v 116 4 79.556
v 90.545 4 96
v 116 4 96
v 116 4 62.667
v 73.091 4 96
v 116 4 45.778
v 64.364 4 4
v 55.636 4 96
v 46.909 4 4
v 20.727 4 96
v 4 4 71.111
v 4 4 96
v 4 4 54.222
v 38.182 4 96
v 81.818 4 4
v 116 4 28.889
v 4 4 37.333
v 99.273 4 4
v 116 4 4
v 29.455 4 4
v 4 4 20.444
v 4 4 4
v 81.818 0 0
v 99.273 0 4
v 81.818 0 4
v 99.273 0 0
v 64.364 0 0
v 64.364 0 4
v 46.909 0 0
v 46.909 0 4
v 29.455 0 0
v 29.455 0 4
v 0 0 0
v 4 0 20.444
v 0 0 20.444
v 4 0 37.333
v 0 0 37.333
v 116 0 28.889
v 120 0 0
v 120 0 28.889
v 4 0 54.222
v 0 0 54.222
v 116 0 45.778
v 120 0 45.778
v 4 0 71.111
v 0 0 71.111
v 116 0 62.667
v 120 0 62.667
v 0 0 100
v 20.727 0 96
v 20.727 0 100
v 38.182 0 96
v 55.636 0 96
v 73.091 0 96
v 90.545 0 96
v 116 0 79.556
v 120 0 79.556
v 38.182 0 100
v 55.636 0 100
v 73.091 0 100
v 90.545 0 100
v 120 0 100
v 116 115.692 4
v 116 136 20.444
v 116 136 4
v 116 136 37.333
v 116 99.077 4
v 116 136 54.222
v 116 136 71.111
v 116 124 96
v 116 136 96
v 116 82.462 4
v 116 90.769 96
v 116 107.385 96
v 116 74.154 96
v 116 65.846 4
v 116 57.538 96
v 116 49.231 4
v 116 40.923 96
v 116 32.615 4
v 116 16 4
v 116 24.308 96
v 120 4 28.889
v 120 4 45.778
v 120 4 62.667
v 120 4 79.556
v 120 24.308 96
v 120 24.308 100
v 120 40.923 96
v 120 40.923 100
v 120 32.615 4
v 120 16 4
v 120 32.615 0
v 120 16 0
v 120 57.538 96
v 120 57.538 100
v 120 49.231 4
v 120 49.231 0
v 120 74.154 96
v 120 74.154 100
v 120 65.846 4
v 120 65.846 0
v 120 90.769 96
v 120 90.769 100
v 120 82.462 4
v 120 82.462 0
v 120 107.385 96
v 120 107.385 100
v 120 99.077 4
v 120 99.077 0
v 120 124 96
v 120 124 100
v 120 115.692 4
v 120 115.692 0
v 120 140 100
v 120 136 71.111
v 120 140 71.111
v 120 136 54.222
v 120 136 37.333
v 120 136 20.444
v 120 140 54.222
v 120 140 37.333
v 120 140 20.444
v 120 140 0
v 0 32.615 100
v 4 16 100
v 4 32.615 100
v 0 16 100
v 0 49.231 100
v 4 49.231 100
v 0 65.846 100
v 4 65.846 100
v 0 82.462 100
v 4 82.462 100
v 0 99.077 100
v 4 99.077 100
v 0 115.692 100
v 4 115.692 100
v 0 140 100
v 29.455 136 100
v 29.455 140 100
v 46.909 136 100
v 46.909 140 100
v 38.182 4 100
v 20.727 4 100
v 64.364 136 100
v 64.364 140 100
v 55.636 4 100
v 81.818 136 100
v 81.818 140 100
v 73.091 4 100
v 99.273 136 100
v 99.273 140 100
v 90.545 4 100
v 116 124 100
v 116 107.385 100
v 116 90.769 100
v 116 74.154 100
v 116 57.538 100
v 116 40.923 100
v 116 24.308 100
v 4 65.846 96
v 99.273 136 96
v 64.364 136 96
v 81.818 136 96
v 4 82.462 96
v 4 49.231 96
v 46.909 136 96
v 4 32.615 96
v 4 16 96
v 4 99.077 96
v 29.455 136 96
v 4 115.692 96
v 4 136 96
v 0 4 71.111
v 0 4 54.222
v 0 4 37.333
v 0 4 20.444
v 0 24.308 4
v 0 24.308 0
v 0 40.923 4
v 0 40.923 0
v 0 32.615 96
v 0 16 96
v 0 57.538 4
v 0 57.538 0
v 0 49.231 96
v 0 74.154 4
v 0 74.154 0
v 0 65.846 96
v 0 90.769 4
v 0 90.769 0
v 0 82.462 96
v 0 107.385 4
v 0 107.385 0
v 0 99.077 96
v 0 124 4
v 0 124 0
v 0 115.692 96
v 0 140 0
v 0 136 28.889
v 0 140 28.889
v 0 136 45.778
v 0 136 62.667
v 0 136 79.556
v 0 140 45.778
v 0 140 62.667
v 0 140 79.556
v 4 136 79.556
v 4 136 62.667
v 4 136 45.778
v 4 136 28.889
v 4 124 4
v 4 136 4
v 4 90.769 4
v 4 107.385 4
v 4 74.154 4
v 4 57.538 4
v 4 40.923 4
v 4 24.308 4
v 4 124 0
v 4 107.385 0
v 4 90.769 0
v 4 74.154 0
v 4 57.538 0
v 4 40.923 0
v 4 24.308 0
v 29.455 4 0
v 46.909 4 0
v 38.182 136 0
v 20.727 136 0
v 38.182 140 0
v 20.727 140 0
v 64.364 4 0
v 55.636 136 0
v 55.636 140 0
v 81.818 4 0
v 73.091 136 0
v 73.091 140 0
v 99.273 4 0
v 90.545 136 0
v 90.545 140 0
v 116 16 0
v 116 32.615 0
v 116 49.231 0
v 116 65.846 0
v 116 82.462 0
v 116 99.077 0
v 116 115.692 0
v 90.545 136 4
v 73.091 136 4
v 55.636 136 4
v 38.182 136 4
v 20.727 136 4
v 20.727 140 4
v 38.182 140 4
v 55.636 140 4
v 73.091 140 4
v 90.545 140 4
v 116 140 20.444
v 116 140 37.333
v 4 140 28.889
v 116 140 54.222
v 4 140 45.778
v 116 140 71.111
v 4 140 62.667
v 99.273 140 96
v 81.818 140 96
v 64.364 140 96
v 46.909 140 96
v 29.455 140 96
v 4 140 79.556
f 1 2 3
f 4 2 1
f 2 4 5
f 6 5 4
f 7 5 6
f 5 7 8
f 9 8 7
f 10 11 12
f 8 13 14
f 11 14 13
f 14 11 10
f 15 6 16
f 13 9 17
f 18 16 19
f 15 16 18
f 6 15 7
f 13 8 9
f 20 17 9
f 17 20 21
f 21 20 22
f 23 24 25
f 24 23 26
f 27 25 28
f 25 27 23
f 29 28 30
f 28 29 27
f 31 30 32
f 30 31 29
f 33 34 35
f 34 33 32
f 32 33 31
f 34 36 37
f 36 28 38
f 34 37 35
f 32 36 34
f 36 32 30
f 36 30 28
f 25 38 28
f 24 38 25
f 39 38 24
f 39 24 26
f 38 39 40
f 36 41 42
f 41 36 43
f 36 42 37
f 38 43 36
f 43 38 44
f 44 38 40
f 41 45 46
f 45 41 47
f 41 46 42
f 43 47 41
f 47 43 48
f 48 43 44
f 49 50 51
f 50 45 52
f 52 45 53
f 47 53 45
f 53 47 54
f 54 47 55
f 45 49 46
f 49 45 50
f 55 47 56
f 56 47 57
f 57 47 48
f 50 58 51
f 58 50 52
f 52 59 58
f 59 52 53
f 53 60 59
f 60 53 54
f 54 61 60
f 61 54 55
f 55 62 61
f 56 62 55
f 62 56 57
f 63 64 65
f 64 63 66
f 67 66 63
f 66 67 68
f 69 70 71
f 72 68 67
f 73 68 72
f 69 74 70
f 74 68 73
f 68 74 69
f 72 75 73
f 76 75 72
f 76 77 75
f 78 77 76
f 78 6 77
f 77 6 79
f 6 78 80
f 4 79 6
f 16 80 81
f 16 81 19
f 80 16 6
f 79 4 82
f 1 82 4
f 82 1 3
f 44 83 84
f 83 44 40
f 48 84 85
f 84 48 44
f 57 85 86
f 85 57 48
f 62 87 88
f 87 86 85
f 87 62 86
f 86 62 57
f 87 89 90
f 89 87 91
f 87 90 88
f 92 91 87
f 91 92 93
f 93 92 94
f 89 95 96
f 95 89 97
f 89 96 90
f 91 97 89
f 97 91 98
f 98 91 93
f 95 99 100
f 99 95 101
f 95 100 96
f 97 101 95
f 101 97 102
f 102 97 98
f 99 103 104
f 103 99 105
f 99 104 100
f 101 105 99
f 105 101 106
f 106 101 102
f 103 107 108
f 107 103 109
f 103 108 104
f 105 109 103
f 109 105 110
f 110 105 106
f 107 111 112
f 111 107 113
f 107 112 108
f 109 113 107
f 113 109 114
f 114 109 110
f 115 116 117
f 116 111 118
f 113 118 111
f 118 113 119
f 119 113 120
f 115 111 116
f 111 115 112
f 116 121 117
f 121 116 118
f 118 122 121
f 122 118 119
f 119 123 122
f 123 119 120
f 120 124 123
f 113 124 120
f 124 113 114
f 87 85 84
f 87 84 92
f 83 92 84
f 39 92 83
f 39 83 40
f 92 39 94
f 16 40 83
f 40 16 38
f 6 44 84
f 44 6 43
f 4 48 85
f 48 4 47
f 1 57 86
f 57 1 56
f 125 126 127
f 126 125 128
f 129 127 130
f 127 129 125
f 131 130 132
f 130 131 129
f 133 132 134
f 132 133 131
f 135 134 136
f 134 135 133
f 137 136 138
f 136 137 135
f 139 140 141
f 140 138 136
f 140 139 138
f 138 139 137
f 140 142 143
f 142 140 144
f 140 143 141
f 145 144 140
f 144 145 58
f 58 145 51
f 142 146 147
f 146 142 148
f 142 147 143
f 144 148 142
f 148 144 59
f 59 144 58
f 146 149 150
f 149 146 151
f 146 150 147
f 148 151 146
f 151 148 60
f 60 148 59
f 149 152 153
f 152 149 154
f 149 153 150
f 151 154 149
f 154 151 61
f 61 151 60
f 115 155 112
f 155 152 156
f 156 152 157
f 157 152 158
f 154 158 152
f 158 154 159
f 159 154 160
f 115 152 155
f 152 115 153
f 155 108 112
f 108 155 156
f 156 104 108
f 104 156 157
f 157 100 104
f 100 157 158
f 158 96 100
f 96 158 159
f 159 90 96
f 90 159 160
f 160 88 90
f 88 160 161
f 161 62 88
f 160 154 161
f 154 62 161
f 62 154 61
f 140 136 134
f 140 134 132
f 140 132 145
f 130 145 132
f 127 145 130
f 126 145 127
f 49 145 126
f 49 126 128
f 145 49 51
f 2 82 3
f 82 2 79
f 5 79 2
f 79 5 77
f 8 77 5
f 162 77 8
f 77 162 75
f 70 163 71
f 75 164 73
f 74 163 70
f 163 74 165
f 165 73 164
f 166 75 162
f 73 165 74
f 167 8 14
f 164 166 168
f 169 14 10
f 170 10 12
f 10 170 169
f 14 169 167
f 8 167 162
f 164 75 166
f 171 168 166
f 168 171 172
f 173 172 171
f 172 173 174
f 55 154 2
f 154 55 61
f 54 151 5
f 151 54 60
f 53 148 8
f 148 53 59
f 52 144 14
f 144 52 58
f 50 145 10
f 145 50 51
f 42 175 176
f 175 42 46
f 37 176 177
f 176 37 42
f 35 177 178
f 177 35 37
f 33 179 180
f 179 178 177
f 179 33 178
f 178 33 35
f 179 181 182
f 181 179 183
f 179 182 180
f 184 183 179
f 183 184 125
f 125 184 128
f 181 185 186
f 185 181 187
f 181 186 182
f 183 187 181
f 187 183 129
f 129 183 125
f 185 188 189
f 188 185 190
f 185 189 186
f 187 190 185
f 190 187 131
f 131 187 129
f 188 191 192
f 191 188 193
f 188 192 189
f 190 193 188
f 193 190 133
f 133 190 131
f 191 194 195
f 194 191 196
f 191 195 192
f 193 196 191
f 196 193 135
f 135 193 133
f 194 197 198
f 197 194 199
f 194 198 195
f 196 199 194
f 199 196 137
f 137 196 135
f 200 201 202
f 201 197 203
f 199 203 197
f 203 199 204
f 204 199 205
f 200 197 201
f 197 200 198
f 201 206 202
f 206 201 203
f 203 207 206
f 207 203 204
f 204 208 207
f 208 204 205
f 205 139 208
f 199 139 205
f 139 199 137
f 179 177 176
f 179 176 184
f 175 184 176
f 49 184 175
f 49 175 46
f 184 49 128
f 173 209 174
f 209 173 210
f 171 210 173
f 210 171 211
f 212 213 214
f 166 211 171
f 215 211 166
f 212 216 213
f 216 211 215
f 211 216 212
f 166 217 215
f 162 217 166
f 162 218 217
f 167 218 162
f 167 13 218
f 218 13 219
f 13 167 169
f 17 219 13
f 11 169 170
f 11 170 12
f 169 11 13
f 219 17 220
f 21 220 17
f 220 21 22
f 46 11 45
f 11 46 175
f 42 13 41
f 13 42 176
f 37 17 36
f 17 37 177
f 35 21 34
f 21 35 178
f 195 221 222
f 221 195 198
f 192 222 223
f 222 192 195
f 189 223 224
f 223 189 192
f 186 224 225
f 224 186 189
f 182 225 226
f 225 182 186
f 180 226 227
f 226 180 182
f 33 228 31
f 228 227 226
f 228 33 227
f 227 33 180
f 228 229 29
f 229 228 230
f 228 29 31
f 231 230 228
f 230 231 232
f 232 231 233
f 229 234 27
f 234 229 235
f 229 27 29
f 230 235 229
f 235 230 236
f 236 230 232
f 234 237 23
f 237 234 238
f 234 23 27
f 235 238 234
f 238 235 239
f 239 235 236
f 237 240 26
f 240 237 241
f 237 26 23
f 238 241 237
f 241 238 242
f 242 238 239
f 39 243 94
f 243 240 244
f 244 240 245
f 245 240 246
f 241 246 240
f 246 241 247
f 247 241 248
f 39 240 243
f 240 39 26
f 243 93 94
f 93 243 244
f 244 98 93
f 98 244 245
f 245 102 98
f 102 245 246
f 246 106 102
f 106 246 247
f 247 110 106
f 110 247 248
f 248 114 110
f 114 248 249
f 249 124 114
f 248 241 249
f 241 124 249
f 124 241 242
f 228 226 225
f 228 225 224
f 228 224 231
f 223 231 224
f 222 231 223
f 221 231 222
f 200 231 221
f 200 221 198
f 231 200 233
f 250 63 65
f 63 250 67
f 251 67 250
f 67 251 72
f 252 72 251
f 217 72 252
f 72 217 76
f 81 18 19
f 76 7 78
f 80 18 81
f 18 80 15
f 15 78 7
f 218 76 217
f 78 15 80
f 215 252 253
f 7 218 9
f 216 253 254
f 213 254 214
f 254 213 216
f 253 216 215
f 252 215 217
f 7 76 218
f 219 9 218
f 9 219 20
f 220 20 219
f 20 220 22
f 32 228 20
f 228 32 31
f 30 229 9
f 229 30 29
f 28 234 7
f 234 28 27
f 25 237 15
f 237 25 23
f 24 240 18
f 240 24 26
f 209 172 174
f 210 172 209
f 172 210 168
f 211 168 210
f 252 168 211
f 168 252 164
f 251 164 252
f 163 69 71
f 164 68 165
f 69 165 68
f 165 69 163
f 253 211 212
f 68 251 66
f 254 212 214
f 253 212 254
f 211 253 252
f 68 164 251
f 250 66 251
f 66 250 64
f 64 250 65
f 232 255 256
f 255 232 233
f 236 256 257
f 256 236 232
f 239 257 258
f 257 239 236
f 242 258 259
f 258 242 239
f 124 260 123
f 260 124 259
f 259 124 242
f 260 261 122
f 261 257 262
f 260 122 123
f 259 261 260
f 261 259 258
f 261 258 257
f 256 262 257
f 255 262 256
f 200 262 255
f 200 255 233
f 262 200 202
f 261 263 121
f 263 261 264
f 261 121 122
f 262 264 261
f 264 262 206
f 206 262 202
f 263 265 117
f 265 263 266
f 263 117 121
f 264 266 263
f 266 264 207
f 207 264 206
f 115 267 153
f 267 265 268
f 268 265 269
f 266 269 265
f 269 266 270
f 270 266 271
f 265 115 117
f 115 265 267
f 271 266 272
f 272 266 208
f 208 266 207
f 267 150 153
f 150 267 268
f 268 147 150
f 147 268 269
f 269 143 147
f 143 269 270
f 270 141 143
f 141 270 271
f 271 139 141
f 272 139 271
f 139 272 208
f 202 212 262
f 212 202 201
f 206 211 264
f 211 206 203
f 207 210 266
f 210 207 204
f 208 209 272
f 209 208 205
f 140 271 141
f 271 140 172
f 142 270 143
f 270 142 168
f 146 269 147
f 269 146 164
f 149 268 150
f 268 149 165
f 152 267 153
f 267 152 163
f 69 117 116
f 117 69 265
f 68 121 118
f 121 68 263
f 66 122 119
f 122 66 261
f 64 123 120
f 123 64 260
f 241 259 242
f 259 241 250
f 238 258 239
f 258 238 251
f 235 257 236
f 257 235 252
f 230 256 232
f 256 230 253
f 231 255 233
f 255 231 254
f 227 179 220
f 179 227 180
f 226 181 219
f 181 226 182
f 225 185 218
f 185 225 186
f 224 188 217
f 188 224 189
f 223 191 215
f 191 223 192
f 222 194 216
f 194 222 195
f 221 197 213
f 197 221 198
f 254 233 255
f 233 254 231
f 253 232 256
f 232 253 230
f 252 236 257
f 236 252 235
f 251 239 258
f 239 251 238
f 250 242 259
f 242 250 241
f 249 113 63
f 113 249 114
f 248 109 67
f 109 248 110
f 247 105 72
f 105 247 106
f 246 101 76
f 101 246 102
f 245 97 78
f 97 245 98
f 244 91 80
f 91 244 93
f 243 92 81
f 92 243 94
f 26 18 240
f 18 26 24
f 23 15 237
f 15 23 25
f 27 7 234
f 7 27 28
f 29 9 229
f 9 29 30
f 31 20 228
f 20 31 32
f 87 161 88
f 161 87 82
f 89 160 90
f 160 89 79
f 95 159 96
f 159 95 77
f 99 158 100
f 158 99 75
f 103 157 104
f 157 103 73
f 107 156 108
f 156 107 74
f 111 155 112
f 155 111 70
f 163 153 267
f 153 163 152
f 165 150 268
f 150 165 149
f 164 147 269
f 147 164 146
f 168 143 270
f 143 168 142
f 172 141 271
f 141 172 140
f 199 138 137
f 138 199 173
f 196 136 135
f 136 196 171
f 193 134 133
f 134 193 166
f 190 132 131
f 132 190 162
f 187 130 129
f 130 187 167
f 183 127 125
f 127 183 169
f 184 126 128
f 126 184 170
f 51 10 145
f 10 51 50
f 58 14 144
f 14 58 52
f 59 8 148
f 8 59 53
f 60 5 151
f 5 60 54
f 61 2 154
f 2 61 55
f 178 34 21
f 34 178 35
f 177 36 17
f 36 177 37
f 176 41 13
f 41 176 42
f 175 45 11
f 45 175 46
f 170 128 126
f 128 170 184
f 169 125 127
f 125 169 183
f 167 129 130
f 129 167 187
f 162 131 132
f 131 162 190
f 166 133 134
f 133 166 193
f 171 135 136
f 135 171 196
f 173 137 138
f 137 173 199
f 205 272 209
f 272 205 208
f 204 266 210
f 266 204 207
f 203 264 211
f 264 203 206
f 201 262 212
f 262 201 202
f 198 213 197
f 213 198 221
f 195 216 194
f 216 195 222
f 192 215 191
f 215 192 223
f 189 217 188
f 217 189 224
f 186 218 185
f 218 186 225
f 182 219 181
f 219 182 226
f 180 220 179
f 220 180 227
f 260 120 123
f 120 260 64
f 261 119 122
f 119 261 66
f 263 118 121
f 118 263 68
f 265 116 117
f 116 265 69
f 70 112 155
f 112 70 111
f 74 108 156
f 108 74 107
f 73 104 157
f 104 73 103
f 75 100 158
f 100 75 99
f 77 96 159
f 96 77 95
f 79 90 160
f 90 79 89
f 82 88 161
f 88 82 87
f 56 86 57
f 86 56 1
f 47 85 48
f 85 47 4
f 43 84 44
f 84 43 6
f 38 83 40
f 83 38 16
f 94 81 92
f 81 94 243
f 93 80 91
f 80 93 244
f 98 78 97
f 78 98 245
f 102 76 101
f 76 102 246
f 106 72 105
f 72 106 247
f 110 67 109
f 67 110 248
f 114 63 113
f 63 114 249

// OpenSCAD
include <../box.scad>
box(width = 120, height = 100, depth = 140, thickness = 4, assemble = true, labels = true);
